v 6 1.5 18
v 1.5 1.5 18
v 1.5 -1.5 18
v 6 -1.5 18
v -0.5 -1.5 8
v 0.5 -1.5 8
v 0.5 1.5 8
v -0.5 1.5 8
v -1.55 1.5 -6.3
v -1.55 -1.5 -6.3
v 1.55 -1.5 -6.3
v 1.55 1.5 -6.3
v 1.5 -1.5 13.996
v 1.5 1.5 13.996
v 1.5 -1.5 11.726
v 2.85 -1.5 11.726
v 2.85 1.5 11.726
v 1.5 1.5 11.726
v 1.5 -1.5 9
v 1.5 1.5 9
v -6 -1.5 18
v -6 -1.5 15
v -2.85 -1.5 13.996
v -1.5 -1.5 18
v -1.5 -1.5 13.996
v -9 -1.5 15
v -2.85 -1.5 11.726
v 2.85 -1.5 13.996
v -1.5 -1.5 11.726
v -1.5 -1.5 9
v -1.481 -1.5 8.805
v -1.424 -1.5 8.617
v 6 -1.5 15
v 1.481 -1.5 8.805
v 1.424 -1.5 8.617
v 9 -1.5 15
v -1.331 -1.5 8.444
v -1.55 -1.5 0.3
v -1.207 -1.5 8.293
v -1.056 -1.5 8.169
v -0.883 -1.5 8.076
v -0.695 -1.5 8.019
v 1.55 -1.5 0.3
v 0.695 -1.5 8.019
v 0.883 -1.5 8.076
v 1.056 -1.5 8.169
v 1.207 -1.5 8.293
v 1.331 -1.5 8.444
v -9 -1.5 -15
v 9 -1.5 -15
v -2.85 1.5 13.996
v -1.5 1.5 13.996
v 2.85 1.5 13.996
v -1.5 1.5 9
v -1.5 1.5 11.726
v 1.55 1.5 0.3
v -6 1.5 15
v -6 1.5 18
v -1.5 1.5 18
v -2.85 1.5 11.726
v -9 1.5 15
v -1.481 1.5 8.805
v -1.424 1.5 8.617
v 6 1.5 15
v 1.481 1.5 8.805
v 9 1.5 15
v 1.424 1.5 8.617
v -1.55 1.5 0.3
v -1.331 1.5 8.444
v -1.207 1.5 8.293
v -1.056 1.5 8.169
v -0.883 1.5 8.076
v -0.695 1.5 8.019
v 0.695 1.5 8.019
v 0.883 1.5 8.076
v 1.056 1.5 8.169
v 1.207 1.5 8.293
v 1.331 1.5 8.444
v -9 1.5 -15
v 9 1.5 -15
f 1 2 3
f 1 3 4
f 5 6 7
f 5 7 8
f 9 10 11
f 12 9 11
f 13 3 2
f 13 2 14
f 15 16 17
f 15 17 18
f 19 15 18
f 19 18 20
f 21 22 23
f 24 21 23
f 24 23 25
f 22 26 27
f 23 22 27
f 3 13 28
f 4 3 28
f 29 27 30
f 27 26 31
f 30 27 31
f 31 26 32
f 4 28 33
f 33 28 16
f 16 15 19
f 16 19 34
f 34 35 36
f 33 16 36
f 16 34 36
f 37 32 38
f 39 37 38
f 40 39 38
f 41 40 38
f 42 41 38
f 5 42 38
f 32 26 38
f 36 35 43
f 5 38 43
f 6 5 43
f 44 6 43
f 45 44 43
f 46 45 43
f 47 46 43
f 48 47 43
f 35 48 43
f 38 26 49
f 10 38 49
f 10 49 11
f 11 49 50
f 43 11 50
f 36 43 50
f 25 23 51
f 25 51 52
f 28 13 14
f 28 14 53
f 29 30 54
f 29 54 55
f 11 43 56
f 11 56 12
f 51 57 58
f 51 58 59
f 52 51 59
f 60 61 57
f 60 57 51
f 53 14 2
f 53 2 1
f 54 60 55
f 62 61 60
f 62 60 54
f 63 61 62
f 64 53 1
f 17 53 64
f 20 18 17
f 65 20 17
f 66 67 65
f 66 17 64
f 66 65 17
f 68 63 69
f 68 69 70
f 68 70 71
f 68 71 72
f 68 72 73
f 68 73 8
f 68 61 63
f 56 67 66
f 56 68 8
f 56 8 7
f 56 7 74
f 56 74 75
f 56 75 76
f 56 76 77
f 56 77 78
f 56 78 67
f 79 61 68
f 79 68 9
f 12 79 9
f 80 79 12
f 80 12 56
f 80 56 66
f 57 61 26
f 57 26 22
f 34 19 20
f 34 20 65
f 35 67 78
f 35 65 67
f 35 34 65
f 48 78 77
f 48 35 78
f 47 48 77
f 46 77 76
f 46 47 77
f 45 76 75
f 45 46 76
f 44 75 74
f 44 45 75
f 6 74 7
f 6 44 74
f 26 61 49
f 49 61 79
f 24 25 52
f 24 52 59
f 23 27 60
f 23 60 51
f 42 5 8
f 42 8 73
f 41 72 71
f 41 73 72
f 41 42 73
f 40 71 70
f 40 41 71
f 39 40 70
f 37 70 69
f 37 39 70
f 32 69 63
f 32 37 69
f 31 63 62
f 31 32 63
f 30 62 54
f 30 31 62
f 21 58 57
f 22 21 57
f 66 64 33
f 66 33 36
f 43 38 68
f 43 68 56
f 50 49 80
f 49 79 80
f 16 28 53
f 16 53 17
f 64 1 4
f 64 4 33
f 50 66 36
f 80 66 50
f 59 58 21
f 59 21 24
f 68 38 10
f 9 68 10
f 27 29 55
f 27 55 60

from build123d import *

# Parameters (mm, degrees)
SKETCH1_W               = 18
SKETCH1_H               = 30
BOSS_EXTRUDE1_DEPTH     = 1.5
SKETCH2_W               = 12
SKETCH2_H               = 3
BOSS_EXTRUDE2_DEPTH     = 1.5
CUT_EXTRUDE2_DEPTH      = 21.180436071
CUT_EXTRUDE2_DEPTH_BACK = 21.180436071
CUT_EXTRUDE1_DEPTH      = 21.180436071
CUT_EXTRUDE1_DEPTH_BACK = 21.180436071
SKETCH3_W               = 3.1
SKETCH3_H               = 6.6


with BuildPart() as part:
    # Sketch1 → Boss-Extrude1 (new, symmetric)
    with BuildSketch(Plane(origin=(0, 0, 0), x_dir=(1, 0, 0), z_dir=(0, 1, 0))):
        Rectangle(SKETCH1_W, SKETCH1_H)
    extrude(amount=BOSS_EXTRUDE1_DEPTH, both=True)

    # Sketch2 → Boss-Extrude2 (add, symmetric)
    with BuildSketch(Plane(origin=(0, 0, 0), x_dir=(1, 0, 0), z_dir=(0, 1, 0))):
        with Locations((0, -16.5)):
            Rectangle(SKETCH2_W, SKETCH2_H)
    extrude(amount=BOSS_EXTRUDE2_DEPTH, both=True)

    # Sketch4 → Cut-Extrude2 (cut, two sides: drawn at the far end of the back side and taken through both)
    with BuildSketch(Plane(origin=(0, 0, 0), x_dir=(1, 0, 0), z_dir=(0, 1, 0)).offset(-CUT_EXTRUDE2_DEPTH_BACK)):
        with BuildLine():
            Line((-1.5, -18), (1.5, -18))
            Line((1.5, -18), (1.5, -13.996114826))
            Line((1.5, -13.996114826), (2.85, -13.996114826))
            Line((2.85, -13.996114826), (2.85, -11.726114826))
            Line((2.85, -11.726114826), (1.5, -11.726114826))
            Line((1.5, -11.726114826), (1.5, -9))
            ThreePointArc((1.5, -9), (1.207106781, -8.292893219), (0.5, -8))
            Line((0.5, -8), (-0.5, -8))
            ThreePointArc((-0.5, -8), (-1.207106781, -8.292893219), (-1.5, -9))
            Line((-1.5, -9), (-1.5, -11.726114826))
            Line((-1.5, -11.726114826), (-2.85, -11.726114826))
            Line((-2.85, -11.726114826), (-2.85, -13.996114826))
            Line((-2.85, -13.996114826), (-1.5, -13.996114826))
            Line((-1.5, -13.996114826), (-1.5, -18))
        make_face()
    extrude(amount=CUT_EXTRUDE2_DEPTH + CUT_EXTRUDE2_DEPTH_BACK, mode=Mode.SUBTRACT)

    # Sketch3 → Cut-Extrude1 (cut, two sides: drawn at the far end of the back side and taken through both)
    with BuildSketch(Plane(origin=(0, 0, 0), x_dir=(1, 0, 0), z_dir=(0, 1, 0)).offset(-CUT_EXTRUDE1_DEPTH_BACK)):
        with Locations((0, 3)):
            Rectangle(SKETCH3_W, SKETCH3_H)
    extrude(amount=CUT_EXTRUDE1_DEPTH + CUT_EXTRUDE1_DEPTH_BACK, mode=Mode.SUBTRACT)


solid = part.part
